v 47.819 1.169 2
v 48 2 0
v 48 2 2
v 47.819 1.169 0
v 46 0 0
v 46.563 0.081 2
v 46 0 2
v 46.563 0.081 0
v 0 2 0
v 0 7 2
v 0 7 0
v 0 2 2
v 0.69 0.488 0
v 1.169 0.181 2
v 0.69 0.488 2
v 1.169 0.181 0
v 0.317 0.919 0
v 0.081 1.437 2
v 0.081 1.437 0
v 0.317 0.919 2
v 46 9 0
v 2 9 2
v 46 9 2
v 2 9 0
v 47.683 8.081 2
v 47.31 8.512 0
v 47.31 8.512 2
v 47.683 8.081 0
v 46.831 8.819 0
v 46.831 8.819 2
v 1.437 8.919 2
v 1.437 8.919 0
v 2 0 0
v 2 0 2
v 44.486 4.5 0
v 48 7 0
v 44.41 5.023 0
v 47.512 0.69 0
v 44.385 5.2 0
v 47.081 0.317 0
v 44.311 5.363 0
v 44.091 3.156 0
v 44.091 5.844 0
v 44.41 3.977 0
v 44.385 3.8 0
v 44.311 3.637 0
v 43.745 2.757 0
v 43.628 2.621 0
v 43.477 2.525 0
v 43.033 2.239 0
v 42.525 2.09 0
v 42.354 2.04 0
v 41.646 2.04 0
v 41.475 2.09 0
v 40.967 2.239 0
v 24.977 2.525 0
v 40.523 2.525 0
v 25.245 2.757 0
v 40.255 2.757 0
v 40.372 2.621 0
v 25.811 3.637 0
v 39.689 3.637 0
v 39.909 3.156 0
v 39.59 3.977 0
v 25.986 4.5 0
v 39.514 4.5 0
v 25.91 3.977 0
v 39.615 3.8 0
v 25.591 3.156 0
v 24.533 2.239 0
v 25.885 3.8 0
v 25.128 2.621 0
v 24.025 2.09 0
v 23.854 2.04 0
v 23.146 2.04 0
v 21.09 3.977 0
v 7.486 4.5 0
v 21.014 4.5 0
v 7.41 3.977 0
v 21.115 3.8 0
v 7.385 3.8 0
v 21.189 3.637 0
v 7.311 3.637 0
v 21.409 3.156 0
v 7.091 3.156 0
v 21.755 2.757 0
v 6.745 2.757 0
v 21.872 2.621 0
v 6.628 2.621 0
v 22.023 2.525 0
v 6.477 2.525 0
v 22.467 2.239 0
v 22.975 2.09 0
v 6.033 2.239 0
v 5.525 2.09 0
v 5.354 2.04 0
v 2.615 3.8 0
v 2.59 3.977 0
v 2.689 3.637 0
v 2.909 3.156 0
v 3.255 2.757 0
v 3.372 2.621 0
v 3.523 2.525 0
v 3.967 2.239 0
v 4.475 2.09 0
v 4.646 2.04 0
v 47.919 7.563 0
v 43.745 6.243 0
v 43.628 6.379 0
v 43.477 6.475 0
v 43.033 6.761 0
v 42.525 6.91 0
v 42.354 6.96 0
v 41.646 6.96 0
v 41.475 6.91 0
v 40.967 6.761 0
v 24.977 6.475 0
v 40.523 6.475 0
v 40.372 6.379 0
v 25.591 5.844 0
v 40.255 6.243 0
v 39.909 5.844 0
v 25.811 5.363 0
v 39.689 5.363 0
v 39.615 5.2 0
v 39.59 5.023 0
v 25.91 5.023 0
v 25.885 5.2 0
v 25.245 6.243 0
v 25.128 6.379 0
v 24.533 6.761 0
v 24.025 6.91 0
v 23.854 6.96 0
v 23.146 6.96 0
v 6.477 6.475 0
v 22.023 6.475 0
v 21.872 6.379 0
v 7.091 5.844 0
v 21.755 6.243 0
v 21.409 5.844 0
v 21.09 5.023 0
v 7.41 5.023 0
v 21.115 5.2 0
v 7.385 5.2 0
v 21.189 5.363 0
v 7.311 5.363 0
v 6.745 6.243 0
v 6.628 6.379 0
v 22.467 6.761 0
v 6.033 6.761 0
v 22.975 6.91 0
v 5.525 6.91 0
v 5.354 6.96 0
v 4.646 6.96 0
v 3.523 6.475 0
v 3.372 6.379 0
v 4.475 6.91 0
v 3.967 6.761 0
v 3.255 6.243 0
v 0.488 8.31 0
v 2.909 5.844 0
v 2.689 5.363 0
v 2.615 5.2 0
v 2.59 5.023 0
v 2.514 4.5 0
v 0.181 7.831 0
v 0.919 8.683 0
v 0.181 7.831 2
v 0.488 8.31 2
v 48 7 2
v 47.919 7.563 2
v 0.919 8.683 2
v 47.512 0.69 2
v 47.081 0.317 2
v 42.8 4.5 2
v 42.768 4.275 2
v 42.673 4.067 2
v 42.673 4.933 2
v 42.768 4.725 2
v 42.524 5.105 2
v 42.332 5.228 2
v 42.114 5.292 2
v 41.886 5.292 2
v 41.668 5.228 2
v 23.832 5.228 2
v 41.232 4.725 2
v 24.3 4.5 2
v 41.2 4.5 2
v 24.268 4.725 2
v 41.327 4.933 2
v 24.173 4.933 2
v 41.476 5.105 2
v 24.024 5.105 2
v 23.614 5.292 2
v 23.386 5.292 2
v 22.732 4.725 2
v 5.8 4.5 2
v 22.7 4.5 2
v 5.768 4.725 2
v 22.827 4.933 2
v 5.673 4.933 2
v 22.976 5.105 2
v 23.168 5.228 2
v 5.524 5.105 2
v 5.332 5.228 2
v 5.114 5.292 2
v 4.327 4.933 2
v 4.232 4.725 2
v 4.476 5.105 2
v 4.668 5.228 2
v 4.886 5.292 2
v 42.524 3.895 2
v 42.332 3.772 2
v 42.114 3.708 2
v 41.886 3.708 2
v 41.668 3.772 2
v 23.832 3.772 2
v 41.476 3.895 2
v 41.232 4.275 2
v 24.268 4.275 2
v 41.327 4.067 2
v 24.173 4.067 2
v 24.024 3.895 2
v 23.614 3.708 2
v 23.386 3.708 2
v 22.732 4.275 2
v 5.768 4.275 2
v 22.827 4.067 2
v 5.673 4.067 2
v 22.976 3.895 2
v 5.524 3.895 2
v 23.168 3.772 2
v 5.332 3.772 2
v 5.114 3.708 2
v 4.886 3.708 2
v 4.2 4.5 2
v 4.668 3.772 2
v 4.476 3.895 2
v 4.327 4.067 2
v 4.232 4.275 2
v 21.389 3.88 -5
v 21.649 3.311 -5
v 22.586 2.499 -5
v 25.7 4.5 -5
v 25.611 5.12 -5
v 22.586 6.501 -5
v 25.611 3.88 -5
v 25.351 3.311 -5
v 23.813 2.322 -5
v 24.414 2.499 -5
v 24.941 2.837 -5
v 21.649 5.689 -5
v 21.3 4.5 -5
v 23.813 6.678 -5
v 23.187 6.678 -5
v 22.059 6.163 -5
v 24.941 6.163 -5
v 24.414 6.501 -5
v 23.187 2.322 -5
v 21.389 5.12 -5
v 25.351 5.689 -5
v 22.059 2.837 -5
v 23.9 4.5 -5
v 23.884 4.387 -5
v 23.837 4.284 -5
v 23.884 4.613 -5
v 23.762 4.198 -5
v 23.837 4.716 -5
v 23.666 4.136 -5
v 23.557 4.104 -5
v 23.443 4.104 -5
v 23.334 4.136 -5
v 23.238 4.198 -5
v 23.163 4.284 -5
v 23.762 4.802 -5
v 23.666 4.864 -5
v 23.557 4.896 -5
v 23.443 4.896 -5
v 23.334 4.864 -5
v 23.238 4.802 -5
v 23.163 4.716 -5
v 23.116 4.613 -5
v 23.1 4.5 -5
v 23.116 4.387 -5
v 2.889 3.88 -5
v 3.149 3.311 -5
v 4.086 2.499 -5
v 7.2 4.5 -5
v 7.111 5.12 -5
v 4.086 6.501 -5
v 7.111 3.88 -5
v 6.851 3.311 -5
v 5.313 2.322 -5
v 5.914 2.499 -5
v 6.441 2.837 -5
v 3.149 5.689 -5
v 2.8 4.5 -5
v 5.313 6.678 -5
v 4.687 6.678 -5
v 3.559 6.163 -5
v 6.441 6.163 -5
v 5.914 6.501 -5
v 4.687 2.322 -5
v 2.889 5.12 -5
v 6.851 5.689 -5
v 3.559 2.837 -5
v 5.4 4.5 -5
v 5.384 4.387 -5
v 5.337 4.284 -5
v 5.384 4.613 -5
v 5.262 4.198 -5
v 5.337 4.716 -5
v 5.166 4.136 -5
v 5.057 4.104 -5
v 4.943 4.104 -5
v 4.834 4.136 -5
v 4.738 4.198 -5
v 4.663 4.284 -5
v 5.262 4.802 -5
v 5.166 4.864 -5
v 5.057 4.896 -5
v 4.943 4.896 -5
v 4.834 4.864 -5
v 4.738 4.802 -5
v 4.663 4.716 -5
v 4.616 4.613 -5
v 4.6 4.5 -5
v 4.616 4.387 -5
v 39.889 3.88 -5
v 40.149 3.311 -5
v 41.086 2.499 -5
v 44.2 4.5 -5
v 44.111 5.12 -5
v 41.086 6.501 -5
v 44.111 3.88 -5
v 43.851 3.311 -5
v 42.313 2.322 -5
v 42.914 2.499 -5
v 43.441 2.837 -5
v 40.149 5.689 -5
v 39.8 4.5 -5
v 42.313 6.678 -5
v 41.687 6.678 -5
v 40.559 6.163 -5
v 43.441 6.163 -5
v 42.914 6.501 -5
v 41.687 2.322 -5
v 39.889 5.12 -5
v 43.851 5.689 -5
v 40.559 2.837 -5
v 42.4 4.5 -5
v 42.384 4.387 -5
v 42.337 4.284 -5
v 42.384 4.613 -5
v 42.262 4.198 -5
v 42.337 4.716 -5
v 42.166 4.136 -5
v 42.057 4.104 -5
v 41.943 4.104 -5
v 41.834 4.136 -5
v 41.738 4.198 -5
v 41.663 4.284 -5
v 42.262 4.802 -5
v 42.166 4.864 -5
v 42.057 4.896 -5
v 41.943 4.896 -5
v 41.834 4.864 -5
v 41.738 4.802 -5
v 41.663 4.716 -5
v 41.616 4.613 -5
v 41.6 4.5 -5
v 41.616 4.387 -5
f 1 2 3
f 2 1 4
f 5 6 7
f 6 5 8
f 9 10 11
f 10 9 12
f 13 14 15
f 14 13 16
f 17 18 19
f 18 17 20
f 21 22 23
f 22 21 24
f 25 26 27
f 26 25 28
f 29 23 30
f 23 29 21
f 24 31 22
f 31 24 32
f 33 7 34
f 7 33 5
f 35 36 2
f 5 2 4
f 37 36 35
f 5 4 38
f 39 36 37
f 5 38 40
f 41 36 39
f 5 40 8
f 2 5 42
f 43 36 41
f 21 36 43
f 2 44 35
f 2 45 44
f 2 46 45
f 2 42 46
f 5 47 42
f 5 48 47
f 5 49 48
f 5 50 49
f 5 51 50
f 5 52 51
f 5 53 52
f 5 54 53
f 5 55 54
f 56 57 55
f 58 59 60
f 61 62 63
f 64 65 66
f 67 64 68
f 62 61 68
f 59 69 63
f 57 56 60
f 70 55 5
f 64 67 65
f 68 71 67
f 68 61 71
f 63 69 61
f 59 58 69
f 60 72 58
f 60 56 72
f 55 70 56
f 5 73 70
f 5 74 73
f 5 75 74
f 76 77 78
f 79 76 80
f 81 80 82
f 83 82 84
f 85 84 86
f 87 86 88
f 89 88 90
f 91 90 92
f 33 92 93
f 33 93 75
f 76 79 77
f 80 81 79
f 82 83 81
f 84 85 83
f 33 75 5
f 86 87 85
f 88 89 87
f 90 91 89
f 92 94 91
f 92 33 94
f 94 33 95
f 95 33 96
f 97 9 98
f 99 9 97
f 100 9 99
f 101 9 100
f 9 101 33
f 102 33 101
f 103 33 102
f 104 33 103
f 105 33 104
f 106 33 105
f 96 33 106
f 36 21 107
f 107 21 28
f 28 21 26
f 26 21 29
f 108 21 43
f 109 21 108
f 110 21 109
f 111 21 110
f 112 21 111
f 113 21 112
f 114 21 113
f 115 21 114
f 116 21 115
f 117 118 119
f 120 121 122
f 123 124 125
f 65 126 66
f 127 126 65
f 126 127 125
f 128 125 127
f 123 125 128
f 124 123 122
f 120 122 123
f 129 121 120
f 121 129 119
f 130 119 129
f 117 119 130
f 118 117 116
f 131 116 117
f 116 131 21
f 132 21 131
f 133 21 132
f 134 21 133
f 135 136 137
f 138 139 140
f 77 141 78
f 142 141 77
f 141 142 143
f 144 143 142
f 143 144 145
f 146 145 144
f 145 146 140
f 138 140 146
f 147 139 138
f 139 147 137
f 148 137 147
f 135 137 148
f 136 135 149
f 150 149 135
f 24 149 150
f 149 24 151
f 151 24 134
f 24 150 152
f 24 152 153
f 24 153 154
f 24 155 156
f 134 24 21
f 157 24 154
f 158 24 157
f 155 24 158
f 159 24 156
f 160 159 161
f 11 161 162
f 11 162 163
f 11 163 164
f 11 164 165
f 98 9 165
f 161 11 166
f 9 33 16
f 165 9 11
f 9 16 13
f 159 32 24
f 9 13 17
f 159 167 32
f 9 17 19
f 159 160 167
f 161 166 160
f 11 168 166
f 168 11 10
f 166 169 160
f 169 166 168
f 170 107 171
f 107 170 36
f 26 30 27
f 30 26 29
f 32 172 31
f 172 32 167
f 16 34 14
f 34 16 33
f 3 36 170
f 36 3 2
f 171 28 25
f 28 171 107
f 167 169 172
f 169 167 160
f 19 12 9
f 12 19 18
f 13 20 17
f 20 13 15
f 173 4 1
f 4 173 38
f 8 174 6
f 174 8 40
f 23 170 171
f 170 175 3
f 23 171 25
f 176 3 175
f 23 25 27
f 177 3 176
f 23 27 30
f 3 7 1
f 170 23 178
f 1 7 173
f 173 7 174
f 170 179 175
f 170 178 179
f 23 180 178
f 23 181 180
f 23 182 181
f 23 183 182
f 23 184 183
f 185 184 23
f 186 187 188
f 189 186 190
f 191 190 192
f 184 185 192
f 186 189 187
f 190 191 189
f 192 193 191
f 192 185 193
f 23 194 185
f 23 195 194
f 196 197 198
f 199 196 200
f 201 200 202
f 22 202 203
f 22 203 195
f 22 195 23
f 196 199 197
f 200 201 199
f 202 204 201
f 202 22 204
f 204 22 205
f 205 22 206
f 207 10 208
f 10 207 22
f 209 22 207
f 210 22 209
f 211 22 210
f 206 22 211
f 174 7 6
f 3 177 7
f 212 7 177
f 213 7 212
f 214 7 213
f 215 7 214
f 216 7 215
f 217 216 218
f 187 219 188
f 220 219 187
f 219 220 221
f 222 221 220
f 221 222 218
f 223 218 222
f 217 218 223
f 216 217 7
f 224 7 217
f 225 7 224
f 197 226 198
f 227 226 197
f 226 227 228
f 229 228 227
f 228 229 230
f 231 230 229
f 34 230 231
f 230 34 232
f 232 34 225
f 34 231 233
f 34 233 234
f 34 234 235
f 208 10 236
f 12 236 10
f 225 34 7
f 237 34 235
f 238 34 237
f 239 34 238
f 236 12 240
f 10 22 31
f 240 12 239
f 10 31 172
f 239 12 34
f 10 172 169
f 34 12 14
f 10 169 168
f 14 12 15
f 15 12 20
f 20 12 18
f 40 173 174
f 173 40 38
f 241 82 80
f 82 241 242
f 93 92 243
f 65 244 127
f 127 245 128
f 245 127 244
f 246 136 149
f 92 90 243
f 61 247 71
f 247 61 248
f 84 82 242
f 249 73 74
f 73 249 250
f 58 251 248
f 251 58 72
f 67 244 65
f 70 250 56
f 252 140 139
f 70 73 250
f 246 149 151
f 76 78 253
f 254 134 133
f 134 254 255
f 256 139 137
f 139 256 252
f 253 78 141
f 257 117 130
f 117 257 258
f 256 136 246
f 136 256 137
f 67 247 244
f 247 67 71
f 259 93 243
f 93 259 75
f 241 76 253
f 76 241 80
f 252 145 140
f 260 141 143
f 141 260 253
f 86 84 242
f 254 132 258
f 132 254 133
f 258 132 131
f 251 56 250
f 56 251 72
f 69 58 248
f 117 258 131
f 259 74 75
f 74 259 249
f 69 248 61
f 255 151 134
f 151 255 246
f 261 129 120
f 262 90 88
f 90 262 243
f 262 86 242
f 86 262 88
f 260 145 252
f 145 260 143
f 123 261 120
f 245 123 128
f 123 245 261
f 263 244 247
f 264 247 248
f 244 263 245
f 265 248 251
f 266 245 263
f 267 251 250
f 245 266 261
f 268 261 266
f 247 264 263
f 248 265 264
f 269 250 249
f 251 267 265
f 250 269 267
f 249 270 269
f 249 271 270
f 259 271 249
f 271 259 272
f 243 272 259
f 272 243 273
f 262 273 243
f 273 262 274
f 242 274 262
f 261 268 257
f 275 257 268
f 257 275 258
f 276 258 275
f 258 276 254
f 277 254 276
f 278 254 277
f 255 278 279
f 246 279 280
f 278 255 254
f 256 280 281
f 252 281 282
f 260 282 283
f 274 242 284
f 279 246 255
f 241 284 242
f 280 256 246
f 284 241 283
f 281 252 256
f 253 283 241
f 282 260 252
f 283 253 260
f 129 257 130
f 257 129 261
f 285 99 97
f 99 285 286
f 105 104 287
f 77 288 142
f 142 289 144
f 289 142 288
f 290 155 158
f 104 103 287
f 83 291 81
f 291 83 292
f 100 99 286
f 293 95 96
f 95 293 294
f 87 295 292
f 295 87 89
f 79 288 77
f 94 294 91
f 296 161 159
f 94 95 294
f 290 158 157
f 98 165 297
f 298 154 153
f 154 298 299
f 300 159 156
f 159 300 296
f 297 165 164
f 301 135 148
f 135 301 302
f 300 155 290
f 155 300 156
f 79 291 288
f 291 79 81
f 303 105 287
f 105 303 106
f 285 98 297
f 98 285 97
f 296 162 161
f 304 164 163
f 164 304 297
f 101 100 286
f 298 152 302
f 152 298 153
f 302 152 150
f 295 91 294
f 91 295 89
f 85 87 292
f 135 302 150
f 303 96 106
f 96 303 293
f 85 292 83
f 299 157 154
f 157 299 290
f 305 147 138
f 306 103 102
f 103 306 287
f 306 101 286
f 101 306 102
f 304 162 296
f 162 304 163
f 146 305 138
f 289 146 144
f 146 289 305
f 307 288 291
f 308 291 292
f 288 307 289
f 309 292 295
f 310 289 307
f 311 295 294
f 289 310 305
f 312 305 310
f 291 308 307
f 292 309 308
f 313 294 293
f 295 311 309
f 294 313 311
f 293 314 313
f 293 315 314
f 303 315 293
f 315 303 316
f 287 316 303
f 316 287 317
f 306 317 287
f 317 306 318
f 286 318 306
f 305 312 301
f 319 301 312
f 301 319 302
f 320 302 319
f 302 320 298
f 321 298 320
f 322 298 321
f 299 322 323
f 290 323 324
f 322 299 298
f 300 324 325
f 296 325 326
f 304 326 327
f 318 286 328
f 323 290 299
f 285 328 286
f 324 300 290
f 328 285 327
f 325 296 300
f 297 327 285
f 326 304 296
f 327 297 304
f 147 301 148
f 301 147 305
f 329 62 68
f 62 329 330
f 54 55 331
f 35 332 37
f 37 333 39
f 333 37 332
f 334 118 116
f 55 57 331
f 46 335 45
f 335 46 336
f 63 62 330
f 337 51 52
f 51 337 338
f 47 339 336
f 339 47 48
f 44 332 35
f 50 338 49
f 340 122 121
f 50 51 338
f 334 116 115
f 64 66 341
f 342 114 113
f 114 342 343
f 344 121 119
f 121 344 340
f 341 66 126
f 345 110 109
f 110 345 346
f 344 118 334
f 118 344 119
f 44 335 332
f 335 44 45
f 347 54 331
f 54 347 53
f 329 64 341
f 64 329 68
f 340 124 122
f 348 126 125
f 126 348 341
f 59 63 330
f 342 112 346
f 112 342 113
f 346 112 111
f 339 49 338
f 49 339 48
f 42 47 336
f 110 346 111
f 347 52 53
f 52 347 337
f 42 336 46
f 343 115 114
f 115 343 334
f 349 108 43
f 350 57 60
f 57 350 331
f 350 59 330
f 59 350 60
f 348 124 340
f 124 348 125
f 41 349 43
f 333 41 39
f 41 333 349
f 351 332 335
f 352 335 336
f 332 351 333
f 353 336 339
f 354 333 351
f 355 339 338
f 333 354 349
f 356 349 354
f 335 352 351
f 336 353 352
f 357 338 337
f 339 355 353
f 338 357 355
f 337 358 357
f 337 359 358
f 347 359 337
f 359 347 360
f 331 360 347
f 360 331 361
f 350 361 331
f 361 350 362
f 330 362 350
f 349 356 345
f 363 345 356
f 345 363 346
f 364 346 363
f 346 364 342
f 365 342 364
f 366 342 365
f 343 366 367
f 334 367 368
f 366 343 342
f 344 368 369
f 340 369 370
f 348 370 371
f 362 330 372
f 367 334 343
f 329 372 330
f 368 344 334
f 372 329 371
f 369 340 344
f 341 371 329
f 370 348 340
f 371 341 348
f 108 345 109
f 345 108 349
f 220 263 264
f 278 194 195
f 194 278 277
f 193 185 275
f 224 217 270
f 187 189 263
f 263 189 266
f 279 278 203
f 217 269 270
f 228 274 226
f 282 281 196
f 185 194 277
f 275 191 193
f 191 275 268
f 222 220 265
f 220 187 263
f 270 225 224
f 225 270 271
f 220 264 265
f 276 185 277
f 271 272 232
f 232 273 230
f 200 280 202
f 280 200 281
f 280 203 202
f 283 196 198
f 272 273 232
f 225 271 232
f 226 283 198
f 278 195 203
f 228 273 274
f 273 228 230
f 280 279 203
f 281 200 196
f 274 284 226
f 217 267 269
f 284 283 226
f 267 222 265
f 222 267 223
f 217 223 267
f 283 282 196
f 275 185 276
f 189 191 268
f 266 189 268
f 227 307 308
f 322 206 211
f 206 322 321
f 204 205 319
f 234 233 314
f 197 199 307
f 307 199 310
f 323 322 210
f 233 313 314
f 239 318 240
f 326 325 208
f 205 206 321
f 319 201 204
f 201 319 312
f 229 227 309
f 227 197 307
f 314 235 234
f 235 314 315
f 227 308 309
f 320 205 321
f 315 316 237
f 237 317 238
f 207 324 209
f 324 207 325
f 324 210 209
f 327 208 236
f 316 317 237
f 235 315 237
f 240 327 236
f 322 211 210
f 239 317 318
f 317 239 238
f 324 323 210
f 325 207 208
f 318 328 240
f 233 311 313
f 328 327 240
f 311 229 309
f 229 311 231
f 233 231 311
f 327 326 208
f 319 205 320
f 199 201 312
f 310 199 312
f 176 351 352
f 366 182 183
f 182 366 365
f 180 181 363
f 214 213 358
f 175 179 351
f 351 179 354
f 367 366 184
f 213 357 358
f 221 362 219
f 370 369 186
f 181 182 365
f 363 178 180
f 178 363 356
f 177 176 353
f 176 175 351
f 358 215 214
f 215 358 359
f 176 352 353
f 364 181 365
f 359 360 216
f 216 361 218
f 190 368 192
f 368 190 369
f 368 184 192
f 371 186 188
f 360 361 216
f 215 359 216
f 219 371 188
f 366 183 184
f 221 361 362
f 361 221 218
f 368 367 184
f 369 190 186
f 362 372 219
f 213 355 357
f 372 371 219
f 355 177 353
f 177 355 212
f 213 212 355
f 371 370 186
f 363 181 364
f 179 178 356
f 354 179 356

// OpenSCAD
// Phone1
// Holder for Nexus 5x in the car
// Old plastic is 75 x 150 x n10 mm high

//-------------------------
module clip1(
    Chi = 18,
    Cwide=10,
    Cthick=2,
    Cdeep=15,
    Cround=3){

    linear_extrude(height=Chi)
    square([Cwide,1.5*Cthick]); 
    
/*    translate([0,0.75*Cthick,0])
    cylinder(r=0.75*Cthick,h=Chi,$fn=22);
        
    translate([Cwide,0.75*Cthick,0])
    cylinder(r=0.75*Cthick,h=Chi,$fn=22);
*/
    color("green")
    linear_extrude(height=Cthick)
    translate([Cround,Cround,0])
    offset(r=Cround,$fn=22)
    square([Cwide-2*Cround,Cdeep-2*Cround]);  

    color("red")
    translate([0,0,4])
    linear_extrude(height=Cthick)
    translate([Cround,Cround,0])
    offset(r=Cround,$fn=22)
    square([Cwide-2*Cround,Cdeep-2*Cround]);  
      
    color("cyan")
    translate([0,0,Chi-Cthick])
    linear_extrude(height=Cthick)
    translate([Cround,Cround,0])
    offset(r=Cround,$fn=22)
    square([Cwide-2*Cround,Cdeep-2*Cround-5]);  
}

//-------------------------
module clip2(
    Chi = 18,
    Cwide=10,
    Cthick=2,
    Cdeep=16.6,
    Cround=3){

    difference(){   // diff1
    union(){
    linear_extrude(height=Chi)
    square([Cwide-0.4,2*Cthick]); 
    
    color("orange")
    translate([0,0,9])
    scale([1,0.4,1])
    rotate([0,90,0])
    cylinder(r=9,h=Cwide-0.4,$fn=44);
    
    color("green")
    linear_extrude(height=Cthick-0.5)
    translate([Cround,Cround,0])
    offset(r=Cround,$fn=22)
    square([Cwide-2*Cround-0.2,Cdeep-2*Cround]);  

    color("red")
    translate([0,0,4.2])
    linear_extrude(height=Cthick-0.2)
    translate([Cround,Cround,0])
    offset(r=Cround,$fn=22)
    square([Cwide-2*Cround-0.4,Cdeep-2*Cround]);  
      
    color("cyan")
    translate([0,0,Chi-Cthick])
    linear_extrude(height=Cthick)
    translate([Cround,Cround,0])
    offset(r=Cround,$fn=22)
    square([Cwide-2*Cround-0.4,Cdeep-2*Cround-9]);  
}   // end of union

    color("pink")
    translate([0,4,11])
    scale([1,0.5,1])
    rotate([0,90,0])
    cylinder(r=5,h=Cwide-0.4,$fn=22);
    
    color("cyan")
    translate([0,4,2.8])
    scale([1,0.85,1])
    rotate([0,90,0])
    cylinder(r=1.5,h=Cwide-0.4,$fn=22);

    color("cyan")
    translate([0,-0.5,5])
    scale([1,0.75,1])
    rotate([0,90,0])
    cylinder(r=1.5,h=Cwide-0.4,$fn=22);

    // CHOOSE ONE:
    // regular cut
/*    
    color("cyan")
    translate([0,-1,11])
    scale([1,0.4,1])
    rotate([0,90,0])
    cylinder(r=2,h=Cwide-0.4,$fn=22);
*/    
    
    // special cut for buttons
    color("cyan")
    translate([0,1.5,11])
    scale([1,0.6,1])
    rotate([0,90,0])
    cylinder(r=2.5,h=Cwide-0.4,$fn=22);

    //  END CHOOSE
}   // end of diff1

    color("pink")
    translate([1,12,1.5])
    scale([1,1,0.4])
    rotate([0,90,0])
    cylinder(r=2.2,h=Cwide-0.4-2,$fn=22);

}
//--------------------------
// Base
module base1(
    Bhi = 150,
    Bwide = 75,
    Bround=7,
    Bthick=4
){

    translate([Bround,Bround,2]) 
    linear_extrude(height=Bthick)
    offset(r=Bround,$fn=44)
    square(size=[Bwide-2*Bround,Bhi-2*Bround]);

}

//--------------------------
// Hinge
module hinge1(
){
    translate([2,0,0])
    difference(){
    
    linear_extrude(height=3)
    offset(r=2,$fn=22)
    translate([0,2,0])
    square([51,7-2]);
    
    linear_extrude(height=1.25)
    square([51,7]);
    }
    
    translate([25.5,2.5,-4])
    cylinder(r1=2.4,r2=2.6,h=7,$fn=22);
    translate([25.5-18.5,2.5,-4])
    cylinder(r1=2.4,r2=2.6,h=7,$fn=22);
    translate([25.5+18.5,2.5,-4])
    cylinder(r1=2.4,r2=2.6,h=7,$fn=22);
        
    
}

//--------------------------
// Hinge
module hinge2(
){
difference(){
    union(){
    translate([2,0,0])
    linear_extrude(height=2)
    offset(r=2,$fn=22)
    translate([0,2,0])
    square([44,5]);
        
    translate([25.5-2,4.5,-5])
    cylinder(r1=2.2,r2=2.6,h=7,$fn=22);
    translate([25.5-18.5-2,4.5,-5])
    cylinder(r1=2.2,r2=2.6,h=7,$fn=22);
    translate([25.5+18.5-2,4.5,-5])
    cylinder(r1=2.2,r2=2.6,h=7,$fn=22);
    }   // end union
    
    translate([25.5-2,4.5,-5])
    cylinder(r1=0.4,r2=0.8,h=7,$fn=22);
    translate([25.5-18.5-2,4.5,-5])
    cylinder(r1=0.4,r2=0.8,h=7,$fn=22);
    translate([25.5+18.5-2,4.5,-5])
    cylinder(r1=0.4,r2=0.8,h=7,$fn=22);
    }   // end diff
}


//===========================

/*
difference(){
base1();

color("red")
translate([15,0,0]) clip1();

color("pink")
translate([75-10-15,0,0]) clip1();


color("cyan")
translate([75,5,0]) 
rotate([0,0,90])clip1();

color("orange")
translate([0,5+10,0]) 
rotate([0,0,-90])clip1();

color("cyan")
translate([75,135,0]) 
rotate([0,0,90])clip1();

color("orange")
translate([0,135+10,0]) 
rotate([0,0,-90])clip1();

color("green")
translate([75/2,105,0]) 
cylinder(r1=14,r2=10,h=7);

translate([63,122,2])
rotate([0,180,0])
hinge1();


}


                // extrude some text
                translate ([75/2,24,6]) color("blue") linear_extrude(height=2){
                text("VINGILOT", font = "Open Sans:style=Bold", size=9,halign="center",valign="center",spacing=1.1);
                }

*/


// hinge1();
//color("orange") clip1();

hinge2();
//translate([15,0,0]) clip2();

//===========================
